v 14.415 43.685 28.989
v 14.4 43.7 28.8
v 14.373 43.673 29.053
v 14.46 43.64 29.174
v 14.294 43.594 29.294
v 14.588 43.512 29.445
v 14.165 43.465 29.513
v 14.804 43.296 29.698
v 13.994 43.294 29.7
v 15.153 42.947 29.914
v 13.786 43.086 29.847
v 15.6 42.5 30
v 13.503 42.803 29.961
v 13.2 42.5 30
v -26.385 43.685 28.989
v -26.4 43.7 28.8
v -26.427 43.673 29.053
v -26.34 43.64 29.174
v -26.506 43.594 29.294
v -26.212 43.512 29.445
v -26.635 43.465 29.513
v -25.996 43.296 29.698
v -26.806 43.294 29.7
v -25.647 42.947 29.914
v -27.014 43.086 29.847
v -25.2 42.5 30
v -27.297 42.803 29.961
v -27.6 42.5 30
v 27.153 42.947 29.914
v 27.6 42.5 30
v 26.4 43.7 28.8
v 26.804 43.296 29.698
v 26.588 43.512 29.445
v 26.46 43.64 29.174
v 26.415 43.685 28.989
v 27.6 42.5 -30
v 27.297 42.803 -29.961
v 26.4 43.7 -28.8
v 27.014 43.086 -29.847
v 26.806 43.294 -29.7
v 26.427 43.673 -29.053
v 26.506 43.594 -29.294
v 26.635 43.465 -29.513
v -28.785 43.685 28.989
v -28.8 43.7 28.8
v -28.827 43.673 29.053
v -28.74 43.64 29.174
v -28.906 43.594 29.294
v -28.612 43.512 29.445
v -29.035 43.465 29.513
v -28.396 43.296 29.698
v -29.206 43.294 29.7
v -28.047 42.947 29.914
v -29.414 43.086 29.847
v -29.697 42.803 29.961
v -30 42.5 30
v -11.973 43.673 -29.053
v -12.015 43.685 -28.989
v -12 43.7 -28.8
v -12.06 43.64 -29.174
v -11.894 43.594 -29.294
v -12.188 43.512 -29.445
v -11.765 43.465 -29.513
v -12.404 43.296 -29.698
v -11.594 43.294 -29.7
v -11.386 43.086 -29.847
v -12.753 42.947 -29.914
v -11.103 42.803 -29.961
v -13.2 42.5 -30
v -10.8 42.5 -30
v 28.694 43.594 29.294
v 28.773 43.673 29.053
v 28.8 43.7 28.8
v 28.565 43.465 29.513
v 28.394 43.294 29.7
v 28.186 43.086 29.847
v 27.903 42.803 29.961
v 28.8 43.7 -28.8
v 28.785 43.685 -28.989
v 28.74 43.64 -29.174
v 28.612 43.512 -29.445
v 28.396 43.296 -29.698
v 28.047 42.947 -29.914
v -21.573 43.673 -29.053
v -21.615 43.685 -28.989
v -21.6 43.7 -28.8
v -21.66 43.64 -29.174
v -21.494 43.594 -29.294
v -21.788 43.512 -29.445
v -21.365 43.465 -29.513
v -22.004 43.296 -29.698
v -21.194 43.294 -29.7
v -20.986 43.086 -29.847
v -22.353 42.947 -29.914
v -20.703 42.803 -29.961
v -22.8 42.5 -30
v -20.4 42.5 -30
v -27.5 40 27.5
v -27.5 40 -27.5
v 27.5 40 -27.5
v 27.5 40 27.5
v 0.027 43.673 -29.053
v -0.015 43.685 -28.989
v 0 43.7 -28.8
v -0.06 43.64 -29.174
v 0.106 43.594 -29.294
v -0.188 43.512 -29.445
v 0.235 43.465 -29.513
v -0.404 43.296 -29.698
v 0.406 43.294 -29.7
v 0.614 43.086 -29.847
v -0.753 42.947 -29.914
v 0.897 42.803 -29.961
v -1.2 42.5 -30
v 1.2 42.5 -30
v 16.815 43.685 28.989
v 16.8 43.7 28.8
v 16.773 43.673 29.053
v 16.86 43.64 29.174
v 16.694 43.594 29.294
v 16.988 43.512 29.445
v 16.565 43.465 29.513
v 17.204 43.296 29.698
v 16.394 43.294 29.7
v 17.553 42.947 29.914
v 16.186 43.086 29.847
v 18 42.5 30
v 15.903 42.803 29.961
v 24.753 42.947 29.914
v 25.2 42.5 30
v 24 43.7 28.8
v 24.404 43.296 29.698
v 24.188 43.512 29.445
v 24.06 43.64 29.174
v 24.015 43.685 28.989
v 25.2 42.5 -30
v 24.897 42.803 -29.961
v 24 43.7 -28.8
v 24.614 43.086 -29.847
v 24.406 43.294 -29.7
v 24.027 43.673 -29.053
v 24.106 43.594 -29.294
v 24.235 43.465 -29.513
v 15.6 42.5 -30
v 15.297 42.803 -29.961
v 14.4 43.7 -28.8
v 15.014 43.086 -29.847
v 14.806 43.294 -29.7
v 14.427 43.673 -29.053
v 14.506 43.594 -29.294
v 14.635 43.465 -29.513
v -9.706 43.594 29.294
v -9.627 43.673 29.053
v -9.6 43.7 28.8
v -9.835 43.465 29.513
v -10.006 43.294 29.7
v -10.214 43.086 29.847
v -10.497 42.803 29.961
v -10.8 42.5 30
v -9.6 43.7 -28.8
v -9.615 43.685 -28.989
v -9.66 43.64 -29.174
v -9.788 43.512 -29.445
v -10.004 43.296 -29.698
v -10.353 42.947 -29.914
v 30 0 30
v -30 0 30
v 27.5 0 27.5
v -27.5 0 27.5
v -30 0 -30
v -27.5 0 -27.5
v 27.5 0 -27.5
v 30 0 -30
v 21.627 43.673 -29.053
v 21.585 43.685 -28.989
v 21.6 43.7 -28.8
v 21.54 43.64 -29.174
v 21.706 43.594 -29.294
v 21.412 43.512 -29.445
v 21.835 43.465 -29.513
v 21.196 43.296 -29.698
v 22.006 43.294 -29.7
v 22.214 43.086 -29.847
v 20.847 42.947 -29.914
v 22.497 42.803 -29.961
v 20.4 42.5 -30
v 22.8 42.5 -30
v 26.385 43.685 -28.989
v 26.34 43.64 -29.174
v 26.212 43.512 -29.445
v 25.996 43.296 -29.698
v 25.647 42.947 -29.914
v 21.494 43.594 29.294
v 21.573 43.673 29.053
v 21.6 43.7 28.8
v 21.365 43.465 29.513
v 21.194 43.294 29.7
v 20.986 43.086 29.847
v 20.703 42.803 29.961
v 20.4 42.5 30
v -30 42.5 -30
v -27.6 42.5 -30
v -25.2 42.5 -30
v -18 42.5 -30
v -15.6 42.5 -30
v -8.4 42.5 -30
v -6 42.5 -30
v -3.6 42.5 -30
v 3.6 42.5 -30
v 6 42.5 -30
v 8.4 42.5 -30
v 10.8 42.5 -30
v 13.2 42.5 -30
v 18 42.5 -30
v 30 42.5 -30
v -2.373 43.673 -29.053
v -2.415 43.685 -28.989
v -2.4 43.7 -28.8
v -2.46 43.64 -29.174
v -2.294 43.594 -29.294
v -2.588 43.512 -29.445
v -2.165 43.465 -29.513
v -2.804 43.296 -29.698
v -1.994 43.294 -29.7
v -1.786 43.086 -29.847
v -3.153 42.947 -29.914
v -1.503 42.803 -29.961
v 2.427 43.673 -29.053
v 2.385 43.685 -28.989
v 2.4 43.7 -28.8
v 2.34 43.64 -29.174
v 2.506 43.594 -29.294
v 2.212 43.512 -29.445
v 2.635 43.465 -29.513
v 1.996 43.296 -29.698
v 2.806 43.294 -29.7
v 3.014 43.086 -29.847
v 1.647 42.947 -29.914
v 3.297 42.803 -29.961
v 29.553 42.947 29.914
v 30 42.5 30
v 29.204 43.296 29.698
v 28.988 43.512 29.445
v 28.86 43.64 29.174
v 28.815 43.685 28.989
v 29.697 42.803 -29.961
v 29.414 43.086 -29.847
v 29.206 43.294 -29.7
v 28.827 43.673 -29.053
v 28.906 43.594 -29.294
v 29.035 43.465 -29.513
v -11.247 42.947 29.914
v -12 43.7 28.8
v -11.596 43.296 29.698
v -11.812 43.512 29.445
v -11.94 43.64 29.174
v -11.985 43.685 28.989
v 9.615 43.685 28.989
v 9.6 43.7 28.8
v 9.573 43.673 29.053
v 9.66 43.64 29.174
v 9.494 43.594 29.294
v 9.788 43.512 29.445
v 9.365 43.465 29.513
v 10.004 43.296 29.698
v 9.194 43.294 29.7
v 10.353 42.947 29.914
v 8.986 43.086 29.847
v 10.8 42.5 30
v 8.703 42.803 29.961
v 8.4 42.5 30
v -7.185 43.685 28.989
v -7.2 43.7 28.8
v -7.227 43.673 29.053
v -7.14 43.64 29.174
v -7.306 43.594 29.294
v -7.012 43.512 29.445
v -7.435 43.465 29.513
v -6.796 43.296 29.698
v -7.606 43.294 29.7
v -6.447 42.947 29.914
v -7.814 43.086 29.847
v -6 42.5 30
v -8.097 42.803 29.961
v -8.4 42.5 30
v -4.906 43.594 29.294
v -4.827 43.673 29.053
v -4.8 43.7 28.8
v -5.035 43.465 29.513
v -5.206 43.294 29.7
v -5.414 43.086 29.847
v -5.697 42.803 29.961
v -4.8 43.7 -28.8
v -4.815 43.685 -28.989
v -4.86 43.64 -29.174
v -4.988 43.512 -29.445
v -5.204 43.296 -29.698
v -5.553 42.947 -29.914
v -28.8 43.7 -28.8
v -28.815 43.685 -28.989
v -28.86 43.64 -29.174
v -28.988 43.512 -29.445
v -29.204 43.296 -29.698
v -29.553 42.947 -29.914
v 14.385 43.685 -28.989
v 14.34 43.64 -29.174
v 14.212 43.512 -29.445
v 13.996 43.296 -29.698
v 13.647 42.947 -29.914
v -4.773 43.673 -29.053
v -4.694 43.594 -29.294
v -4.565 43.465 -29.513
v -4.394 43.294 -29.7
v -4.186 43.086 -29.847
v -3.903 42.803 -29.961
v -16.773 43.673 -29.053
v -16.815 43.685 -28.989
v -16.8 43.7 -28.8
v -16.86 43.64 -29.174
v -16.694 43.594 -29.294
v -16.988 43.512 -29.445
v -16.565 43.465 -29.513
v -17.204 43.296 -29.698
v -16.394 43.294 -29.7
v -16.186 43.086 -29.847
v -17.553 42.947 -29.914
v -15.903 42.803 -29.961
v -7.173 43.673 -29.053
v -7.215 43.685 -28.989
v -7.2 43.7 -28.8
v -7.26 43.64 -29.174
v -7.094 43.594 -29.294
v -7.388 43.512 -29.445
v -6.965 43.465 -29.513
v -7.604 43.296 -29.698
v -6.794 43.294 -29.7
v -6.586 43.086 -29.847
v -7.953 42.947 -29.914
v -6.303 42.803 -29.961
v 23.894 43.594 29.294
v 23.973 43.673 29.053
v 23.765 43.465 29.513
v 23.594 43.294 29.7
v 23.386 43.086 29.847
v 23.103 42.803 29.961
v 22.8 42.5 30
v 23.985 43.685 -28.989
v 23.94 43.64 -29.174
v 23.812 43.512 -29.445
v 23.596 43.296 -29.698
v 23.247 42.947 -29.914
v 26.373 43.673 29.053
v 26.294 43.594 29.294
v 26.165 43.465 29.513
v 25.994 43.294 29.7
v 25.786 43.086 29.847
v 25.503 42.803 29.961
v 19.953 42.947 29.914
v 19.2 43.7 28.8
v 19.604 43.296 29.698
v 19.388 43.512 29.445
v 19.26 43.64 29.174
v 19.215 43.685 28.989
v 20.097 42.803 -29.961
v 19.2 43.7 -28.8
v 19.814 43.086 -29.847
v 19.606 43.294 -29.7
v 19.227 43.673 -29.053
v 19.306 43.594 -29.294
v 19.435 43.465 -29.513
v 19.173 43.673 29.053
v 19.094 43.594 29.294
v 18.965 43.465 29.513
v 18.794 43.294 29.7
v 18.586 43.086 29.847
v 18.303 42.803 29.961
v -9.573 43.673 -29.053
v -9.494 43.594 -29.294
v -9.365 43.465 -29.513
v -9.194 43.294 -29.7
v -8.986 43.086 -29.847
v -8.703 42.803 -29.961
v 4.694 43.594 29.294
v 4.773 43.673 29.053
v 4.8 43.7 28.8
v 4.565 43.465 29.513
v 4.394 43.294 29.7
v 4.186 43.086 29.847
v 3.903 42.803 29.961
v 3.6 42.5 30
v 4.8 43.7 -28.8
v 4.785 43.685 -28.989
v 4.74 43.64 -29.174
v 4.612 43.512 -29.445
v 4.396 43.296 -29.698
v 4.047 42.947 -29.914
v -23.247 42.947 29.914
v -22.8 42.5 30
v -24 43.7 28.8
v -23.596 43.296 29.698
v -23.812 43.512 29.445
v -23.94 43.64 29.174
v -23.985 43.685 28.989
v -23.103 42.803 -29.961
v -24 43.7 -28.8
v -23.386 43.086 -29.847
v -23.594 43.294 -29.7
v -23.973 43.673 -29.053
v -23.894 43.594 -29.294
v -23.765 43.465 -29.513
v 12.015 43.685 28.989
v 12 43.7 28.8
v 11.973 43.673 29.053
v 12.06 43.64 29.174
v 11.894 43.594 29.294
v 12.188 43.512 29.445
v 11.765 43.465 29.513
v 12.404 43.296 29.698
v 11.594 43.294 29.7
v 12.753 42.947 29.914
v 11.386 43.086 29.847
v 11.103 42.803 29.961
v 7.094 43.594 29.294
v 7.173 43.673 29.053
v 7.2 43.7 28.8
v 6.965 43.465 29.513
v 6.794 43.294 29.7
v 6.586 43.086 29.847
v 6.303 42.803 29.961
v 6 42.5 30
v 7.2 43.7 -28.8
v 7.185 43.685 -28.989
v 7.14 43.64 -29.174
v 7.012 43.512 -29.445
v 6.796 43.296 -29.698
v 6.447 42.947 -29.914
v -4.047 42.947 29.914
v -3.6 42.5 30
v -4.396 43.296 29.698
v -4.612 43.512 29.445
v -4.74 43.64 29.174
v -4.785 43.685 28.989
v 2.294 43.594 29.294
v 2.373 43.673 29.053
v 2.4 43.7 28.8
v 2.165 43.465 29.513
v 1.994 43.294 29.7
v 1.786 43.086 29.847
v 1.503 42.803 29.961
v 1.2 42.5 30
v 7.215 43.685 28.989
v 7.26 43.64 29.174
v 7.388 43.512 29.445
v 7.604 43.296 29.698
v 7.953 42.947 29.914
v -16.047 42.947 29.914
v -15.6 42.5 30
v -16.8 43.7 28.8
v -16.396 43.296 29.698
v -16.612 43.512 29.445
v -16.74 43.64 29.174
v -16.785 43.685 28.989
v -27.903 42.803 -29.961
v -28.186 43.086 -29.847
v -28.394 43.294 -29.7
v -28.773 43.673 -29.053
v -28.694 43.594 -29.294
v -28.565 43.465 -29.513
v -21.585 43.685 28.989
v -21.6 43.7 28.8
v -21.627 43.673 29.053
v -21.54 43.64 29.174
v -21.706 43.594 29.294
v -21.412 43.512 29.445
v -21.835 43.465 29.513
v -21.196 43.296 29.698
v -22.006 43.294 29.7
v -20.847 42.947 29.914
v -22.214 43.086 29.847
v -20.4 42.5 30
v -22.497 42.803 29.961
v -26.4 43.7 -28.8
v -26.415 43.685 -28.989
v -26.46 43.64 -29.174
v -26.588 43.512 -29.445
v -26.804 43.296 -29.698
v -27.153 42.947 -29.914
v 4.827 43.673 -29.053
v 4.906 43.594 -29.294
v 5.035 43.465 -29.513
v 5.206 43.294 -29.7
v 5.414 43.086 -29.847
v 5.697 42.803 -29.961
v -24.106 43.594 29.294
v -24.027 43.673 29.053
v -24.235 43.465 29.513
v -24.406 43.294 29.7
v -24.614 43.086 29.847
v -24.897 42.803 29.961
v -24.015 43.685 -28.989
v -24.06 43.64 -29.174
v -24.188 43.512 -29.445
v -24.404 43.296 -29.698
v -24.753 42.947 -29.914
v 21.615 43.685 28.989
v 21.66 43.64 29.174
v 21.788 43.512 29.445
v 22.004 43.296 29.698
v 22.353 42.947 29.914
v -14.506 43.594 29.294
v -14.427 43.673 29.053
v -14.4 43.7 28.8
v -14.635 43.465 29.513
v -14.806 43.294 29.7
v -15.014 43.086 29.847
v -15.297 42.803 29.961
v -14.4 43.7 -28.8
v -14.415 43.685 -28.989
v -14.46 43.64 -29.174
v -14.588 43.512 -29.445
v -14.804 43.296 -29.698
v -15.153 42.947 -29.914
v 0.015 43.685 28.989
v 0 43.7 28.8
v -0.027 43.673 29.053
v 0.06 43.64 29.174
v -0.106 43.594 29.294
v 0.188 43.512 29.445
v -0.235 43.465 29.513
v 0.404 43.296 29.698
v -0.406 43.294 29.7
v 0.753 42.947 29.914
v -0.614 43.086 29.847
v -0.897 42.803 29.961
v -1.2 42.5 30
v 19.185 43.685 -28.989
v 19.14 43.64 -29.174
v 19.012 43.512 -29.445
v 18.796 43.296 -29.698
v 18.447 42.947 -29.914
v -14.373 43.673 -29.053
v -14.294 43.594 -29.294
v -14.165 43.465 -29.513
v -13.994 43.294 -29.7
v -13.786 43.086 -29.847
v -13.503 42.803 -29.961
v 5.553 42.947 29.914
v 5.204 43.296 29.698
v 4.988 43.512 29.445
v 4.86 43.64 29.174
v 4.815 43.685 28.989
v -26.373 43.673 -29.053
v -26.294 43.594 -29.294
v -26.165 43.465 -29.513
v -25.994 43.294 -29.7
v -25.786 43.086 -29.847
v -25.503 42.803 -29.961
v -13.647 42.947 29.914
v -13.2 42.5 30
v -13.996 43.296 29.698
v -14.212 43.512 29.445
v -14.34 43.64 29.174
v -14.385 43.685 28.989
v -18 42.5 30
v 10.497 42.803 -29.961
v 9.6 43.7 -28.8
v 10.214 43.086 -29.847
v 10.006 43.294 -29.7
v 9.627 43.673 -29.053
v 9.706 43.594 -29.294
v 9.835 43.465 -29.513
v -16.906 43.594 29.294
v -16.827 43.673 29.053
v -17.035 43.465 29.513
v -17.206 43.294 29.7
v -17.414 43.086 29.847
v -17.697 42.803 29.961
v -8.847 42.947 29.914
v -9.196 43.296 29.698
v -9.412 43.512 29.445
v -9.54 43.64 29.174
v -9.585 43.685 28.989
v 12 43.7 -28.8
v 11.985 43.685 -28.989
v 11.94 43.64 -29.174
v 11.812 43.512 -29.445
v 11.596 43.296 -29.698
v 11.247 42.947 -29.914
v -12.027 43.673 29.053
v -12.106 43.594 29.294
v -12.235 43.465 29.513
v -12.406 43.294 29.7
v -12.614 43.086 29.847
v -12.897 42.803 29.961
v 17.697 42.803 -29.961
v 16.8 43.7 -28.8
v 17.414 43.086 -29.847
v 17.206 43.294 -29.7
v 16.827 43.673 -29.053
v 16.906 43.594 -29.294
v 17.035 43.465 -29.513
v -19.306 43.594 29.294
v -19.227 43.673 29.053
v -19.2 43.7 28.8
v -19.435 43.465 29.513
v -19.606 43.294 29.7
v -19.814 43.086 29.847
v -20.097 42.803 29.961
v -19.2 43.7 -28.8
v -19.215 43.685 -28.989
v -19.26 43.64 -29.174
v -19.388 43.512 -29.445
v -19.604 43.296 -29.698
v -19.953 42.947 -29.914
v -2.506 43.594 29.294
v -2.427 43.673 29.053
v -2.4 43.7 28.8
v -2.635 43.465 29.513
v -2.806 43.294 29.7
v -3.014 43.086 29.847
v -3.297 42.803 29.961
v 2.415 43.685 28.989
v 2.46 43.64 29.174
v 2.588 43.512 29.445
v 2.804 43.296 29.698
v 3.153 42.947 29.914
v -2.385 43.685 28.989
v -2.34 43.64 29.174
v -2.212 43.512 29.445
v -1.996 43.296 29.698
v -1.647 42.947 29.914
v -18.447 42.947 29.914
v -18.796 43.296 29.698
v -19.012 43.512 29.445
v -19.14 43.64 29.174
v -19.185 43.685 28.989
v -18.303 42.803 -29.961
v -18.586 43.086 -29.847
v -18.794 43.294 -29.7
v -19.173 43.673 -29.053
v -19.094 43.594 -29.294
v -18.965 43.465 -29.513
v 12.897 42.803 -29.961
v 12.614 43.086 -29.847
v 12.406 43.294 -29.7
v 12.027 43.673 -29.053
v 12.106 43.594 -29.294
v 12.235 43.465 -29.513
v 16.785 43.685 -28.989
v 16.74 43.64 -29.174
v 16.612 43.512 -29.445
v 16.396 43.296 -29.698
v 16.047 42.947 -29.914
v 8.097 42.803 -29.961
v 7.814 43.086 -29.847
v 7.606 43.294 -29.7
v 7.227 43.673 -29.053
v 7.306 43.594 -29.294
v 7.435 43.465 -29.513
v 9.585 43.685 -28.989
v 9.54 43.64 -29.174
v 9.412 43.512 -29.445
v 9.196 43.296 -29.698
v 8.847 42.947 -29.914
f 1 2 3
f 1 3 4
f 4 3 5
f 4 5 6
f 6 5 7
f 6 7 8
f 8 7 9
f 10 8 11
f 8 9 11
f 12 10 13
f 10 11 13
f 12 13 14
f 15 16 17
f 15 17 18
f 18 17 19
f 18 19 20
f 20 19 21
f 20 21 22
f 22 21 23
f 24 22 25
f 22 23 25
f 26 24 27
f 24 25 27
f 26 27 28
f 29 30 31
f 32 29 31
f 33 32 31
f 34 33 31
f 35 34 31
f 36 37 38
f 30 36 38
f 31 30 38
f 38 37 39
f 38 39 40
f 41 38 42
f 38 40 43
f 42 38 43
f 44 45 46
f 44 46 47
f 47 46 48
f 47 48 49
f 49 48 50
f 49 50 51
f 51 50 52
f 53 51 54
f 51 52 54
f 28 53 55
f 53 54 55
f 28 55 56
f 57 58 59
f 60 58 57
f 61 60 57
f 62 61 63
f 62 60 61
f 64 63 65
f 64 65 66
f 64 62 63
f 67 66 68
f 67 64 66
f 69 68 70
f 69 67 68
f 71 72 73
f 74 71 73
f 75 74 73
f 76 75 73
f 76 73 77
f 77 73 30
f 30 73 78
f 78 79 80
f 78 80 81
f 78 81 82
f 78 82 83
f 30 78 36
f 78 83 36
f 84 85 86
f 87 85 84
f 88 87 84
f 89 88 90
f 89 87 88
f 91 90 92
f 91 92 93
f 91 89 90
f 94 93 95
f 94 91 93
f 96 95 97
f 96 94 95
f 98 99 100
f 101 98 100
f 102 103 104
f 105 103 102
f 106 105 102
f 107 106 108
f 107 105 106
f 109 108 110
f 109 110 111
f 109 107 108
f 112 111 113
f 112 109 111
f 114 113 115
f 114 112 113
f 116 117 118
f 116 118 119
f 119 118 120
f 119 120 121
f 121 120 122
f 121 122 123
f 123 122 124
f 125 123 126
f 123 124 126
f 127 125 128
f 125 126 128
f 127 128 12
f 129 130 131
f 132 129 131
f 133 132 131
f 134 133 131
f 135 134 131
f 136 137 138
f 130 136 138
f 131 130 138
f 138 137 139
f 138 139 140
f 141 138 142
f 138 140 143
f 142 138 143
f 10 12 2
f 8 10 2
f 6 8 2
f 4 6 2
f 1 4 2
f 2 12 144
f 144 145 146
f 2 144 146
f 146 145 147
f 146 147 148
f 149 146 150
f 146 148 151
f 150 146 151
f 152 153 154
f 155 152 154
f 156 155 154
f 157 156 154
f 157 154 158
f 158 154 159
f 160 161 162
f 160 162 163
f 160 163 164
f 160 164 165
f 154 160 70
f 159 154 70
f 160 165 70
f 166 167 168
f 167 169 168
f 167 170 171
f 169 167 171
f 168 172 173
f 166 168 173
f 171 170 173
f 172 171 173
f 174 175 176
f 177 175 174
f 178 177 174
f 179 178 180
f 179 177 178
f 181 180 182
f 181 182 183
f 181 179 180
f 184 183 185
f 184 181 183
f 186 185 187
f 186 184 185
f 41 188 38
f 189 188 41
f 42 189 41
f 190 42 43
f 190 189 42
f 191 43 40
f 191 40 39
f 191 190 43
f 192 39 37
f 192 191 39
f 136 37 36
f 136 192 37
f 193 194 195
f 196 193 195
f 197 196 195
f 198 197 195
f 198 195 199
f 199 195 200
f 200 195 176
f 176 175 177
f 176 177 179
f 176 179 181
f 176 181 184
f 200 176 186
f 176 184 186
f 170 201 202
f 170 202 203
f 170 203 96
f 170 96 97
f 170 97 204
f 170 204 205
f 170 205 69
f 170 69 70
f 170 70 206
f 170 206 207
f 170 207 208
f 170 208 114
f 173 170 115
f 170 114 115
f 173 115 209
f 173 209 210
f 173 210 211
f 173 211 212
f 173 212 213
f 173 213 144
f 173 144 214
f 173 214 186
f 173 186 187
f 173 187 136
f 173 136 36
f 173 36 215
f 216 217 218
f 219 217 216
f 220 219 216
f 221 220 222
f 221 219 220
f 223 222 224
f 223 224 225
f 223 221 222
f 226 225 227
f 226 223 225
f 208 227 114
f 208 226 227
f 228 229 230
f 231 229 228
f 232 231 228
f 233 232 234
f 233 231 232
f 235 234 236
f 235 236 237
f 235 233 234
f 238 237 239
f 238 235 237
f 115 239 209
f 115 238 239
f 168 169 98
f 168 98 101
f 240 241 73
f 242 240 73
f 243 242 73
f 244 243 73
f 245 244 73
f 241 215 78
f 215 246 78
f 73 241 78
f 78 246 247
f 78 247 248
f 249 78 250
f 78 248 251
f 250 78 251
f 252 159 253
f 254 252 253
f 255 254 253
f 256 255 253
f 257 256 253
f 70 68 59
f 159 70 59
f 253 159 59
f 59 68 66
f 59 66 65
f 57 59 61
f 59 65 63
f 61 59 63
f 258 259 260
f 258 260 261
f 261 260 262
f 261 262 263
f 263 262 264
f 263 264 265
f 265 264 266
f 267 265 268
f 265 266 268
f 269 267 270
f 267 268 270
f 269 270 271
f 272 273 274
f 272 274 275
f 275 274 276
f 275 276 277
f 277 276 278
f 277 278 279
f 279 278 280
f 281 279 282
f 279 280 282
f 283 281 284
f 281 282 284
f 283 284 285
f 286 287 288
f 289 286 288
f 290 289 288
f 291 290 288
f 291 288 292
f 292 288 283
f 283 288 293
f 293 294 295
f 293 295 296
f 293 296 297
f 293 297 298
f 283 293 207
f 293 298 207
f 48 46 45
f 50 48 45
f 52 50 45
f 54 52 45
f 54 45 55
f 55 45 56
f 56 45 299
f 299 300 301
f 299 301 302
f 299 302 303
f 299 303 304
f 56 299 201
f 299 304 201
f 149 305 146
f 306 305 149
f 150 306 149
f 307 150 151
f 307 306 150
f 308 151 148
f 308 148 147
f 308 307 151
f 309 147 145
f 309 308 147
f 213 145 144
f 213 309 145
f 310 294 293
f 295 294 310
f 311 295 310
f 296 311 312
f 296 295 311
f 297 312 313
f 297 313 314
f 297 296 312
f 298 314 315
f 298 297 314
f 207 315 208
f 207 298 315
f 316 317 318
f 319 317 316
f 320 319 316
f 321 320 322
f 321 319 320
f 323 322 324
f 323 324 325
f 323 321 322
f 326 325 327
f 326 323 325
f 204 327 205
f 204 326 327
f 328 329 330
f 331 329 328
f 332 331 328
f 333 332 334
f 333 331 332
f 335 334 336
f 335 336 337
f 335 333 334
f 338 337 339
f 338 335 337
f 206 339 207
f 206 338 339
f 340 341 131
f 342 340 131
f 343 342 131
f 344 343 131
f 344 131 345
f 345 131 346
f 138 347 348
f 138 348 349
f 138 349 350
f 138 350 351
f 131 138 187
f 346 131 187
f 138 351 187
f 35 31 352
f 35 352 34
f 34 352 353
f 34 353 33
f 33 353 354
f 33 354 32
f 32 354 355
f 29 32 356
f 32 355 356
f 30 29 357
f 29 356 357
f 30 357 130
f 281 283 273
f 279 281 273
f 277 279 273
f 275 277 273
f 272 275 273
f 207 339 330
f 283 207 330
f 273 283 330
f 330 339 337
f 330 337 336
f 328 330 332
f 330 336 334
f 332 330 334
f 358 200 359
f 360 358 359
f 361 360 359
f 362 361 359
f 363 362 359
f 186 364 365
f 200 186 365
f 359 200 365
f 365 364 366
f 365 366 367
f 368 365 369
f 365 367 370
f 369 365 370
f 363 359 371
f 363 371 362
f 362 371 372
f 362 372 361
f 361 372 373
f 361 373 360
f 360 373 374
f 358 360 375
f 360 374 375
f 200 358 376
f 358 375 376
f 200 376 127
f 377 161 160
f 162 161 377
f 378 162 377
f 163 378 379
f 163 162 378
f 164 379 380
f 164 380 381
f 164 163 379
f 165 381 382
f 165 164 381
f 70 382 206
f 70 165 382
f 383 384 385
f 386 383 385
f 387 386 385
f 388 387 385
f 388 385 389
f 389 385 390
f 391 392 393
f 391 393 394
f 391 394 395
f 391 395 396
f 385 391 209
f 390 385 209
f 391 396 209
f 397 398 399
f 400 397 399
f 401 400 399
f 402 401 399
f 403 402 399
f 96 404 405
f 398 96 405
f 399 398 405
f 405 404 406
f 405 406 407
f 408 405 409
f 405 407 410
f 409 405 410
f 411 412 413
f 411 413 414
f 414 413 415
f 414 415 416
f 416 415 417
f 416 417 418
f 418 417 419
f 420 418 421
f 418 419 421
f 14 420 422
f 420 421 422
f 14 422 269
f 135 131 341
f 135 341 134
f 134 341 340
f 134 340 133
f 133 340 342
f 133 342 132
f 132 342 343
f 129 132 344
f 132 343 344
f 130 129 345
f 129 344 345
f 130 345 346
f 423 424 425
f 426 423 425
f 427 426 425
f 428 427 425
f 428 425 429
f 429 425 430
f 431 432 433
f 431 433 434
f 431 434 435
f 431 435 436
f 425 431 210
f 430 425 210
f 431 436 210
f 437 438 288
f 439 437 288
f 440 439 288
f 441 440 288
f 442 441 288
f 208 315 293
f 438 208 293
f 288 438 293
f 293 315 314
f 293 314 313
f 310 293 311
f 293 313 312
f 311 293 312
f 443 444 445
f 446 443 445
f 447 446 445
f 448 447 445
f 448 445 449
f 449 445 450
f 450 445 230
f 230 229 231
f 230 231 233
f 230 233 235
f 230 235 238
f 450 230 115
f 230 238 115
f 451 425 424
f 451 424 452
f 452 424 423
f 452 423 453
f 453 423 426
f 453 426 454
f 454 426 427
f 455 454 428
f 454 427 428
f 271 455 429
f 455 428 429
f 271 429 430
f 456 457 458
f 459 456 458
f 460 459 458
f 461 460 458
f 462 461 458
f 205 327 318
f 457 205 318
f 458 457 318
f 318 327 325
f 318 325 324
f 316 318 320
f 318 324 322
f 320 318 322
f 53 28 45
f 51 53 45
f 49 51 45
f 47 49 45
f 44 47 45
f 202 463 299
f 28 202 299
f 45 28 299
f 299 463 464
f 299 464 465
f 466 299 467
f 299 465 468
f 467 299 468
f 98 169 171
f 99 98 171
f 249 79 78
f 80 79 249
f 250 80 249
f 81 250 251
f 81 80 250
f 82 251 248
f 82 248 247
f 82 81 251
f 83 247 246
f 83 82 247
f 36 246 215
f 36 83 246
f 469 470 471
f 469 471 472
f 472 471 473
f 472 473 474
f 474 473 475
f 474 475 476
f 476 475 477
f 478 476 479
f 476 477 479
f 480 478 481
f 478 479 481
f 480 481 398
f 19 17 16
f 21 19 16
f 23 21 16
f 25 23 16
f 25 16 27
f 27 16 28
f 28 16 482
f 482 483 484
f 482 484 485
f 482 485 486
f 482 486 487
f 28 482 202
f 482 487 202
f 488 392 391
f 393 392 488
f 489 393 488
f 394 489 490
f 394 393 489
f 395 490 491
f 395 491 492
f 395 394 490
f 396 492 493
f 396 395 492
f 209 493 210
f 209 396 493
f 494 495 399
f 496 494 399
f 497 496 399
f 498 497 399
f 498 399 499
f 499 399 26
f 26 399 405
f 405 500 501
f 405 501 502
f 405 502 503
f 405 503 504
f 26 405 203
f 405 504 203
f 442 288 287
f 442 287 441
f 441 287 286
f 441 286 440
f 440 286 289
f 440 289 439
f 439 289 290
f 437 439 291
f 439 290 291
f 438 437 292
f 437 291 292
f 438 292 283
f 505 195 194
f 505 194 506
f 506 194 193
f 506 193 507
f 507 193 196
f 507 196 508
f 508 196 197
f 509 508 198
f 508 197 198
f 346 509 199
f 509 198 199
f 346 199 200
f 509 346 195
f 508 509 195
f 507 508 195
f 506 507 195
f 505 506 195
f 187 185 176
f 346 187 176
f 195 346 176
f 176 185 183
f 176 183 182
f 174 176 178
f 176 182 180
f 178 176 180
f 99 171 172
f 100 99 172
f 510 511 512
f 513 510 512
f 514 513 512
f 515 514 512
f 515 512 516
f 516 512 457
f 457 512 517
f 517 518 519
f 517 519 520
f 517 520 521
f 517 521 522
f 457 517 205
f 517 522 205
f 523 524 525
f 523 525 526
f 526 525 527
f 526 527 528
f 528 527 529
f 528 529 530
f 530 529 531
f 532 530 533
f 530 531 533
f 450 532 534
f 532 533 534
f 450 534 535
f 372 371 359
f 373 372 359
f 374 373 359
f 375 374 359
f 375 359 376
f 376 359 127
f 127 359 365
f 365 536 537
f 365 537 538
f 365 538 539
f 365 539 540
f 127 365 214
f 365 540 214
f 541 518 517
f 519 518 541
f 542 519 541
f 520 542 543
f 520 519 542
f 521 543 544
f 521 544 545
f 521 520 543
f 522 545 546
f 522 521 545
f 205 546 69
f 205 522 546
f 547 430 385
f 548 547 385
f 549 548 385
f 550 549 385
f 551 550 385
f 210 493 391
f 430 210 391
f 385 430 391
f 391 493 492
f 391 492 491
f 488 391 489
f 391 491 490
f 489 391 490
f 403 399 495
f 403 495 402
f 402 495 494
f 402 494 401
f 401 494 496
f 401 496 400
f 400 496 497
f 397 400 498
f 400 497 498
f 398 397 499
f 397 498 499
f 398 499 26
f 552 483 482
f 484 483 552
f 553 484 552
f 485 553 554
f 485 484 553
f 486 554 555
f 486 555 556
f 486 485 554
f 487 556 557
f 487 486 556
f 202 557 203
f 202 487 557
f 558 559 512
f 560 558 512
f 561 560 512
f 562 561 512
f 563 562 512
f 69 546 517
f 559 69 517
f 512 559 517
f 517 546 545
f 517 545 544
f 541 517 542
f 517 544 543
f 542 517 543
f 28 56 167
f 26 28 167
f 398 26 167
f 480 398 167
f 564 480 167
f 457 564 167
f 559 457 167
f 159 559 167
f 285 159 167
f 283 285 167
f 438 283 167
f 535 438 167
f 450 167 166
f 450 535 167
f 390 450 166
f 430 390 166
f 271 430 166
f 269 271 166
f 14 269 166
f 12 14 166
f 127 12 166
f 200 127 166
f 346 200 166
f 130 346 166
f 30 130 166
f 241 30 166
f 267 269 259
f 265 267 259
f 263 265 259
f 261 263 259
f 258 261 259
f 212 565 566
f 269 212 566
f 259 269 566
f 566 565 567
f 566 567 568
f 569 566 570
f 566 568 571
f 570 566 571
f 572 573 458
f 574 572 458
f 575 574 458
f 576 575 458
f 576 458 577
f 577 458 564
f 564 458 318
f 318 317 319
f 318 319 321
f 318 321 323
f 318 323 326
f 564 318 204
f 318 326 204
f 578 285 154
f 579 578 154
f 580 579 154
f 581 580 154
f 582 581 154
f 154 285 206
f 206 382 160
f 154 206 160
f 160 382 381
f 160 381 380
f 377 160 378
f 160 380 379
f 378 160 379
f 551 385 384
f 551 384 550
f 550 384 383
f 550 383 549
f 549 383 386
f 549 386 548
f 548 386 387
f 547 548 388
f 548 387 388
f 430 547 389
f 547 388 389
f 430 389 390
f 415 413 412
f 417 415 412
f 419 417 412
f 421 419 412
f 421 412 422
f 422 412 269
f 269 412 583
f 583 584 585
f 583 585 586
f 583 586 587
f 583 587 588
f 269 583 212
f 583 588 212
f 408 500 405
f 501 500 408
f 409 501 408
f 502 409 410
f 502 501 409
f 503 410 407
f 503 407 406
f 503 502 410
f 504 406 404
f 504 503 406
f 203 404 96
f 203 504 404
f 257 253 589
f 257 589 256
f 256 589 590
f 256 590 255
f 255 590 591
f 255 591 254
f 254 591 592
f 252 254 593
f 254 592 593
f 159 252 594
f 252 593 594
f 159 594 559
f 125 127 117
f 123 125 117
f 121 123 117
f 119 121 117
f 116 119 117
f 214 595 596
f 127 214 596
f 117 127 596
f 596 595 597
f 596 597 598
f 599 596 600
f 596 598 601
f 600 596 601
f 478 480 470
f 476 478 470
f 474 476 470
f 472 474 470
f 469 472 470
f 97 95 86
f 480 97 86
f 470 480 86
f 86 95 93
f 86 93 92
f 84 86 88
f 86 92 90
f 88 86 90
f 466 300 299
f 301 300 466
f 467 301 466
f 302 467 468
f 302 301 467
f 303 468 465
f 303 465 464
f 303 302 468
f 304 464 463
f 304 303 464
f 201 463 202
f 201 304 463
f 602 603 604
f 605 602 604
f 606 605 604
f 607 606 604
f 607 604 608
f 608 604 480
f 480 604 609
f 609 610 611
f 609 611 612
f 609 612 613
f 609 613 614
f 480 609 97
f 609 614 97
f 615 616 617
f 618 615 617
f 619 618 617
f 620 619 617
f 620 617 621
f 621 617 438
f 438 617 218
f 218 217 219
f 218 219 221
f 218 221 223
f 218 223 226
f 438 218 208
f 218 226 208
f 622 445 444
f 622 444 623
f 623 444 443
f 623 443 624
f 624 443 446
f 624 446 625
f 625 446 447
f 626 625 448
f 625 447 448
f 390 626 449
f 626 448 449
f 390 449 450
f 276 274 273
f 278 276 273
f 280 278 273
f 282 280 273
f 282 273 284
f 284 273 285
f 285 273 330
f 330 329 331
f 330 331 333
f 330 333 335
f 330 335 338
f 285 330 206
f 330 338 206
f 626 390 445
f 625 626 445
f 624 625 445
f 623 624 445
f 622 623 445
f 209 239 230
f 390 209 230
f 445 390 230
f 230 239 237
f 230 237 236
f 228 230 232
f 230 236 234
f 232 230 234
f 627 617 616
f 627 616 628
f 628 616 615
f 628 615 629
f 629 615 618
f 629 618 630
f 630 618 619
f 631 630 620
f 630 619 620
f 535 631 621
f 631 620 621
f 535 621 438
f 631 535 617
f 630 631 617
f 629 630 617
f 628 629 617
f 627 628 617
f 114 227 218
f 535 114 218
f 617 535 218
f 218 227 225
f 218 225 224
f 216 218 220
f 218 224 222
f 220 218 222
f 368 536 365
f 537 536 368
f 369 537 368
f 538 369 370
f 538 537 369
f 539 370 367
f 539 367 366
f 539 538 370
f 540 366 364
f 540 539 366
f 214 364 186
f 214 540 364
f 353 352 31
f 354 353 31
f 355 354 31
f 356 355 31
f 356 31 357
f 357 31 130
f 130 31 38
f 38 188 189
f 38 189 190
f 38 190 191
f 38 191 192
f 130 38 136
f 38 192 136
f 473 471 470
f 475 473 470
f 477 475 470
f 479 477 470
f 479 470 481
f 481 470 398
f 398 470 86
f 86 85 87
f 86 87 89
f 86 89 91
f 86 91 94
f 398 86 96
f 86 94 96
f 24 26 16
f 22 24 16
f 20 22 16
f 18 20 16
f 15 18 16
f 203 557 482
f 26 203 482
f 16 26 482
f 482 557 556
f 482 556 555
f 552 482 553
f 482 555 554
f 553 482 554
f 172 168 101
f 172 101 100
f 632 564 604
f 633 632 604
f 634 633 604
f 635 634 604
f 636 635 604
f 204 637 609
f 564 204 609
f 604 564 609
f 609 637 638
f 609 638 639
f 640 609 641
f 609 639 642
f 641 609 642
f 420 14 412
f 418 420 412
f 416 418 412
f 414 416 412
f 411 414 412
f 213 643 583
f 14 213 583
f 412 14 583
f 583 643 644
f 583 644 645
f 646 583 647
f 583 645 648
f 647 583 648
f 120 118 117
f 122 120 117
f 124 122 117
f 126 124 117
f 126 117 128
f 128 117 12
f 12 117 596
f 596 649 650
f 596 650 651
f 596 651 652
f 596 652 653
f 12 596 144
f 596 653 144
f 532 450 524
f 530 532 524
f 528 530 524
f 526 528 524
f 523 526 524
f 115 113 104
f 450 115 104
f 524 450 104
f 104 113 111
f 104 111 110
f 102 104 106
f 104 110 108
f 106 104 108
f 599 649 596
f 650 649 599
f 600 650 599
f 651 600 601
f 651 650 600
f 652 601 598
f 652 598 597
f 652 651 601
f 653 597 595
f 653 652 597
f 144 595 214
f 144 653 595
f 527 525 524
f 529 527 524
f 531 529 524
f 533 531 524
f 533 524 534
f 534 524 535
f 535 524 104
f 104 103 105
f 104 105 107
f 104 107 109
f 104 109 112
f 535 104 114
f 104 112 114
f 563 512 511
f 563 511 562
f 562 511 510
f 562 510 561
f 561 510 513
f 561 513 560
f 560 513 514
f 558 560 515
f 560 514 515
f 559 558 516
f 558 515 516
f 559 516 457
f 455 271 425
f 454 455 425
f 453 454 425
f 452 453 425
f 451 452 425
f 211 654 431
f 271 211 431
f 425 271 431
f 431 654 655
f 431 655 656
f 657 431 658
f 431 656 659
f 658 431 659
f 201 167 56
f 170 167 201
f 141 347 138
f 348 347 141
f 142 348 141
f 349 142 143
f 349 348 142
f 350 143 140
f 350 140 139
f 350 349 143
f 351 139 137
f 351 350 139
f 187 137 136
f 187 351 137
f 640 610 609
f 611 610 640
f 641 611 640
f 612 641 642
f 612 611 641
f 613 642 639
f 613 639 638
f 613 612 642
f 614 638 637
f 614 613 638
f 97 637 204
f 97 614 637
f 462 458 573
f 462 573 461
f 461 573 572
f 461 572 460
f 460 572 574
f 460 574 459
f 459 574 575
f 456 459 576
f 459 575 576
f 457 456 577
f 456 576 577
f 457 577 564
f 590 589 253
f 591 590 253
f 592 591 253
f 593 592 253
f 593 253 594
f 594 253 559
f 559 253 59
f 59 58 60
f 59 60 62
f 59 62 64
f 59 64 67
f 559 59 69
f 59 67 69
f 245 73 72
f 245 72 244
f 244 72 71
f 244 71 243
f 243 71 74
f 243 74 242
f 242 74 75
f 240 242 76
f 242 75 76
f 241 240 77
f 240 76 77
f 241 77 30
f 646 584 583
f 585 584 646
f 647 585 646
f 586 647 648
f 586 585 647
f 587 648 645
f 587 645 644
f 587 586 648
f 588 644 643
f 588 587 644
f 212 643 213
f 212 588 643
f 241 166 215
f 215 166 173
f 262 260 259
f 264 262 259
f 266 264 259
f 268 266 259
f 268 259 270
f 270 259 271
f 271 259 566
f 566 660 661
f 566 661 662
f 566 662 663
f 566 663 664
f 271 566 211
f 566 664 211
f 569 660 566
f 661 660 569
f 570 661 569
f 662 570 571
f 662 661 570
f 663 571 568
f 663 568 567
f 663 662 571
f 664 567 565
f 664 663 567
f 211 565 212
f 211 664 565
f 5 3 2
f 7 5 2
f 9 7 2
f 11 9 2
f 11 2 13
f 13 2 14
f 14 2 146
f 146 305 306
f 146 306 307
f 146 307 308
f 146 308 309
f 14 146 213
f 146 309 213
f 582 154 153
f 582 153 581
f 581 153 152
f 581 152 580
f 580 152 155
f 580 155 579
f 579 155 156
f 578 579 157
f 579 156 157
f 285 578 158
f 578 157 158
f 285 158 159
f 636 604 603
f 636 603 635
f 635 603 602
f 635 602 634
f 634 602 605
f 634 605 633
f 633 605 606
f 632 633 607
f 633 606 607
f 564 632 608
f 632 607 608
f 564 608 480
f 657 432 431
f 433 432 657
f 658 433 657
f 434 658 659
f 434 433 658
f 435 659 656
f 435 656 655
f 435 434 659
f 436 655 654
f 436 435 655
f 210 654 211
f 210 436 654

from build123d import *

# Parameters (mm, degrees)
SKETCH1_W           = 60
SKETCH1_H           = 60
SKETCH1_W_2         = 55
SKETCH1_H_2         = 55
BOSS_EXTRUDE1_DEPTH = 40
SKETCH2_W           = 60
SKETCH2_H           = 60
BOSS_EXTRUDE2_DEPTH = 2.5
BOSS_EXTRUDE3_DEPTH = 60
CUT_EXTRUDE1_REACH  = 82.061


with BuildPart() as part:
    # Sketch1 → Boss-Extrude1 (new body)
    with BuildSketch(Plane(origin=(0, 0, 0), x_dir=(1, 0, 0), z_dir=(0, 1, 0))):
        Rectangle(SKETCH1_W, SKETCH1_H)
        Rectangle(SKETCH1_W_2, SKETCH1_H_2, mode=Mode.SUBTRACT)
    extrude(amount=BOSS_EXTRUDE1_DEPTH)

    # Sketch2 → Boss-Extrude2 (add)
    with BuildSketch(Plane(origin=(0, 40, 0), x_dir=(1, 0, 0), z_dir=(0, 1, 0))):
        Rectangle(SKETCH2_W, SKETCH2_H)
    extrude(amount=BOSS_EXTRUDE2_DEPTH)

    # Sketch3 → Boss-Extrude3 (add)
    with BuildSketch(Plane(origin=(0, 0, -30), x_dir=(-1, 0, 0), z_dir=(0, 0, -1))):
        Polygon((-30, 42.5), (-28.8, 43.7), (-27.6, 42.5), (-26.4, 43.7), (-25.2, 42.5), (-24, 43.7), (-22.8, 42.5), (-21.6, 43.7), (-20.4, 42.5), (-19.2, 43.7), (-18, 42.5), (-16.8, 43.7), (-15.6, 42.5), (-14.4, 43.7), (-13.2, 42.5), (-12, 43.7), (-10.8, 42.5), (-9.6, 43.7), (-8.4, 42.5), (-7.2, 43.7), (-6, 42.5), (-4.8, 43.7), (-3.6, 42.5), (-2.4, 43.7), (-1.2, 42.5), (0, 43.7), (1.2, 42.5), (2.4, 43.7), (3.6, 42.5), (4.8, 43.7), (6, 42.5), (7.2, 43.7), (8.4, 42.5), (9.6, 43.7), (10.8, 42.5), (12, 43.7), (13.2, 42.5), (14.4, 43.7), (15.6, 42.5), (16.8, 43.7), (18, 42.5), (19.2, 43.7), (20.4, 42.5), (21.6, 43.7), (22.8, 42.5), (24, 43.7), (25.2, 42.5), (26.4, 43.7), (27.6, 42.5), (28.8, 43.7), (30, 42.5), (30, 42.170064374), (-30, 42.170064374), align=None)
    extrude(amount=-BOSS_EXTRUDE3_DEPTH)

    # Cut-Extrude1: up to this face of the body (flat: up to its plane)
    cut_extrude1_end = Plane(part.part.faces().sort_by_distance((30, 21.25, 0))[0])
    # Sketch4 → Cut-Extrude1 (cut, up to the picked face)
    with BuildSketch(Plane.ZY.offset(30), mode=Mode.PRIVATE) as cut_extrude1_sk1:
        with BuildLine():
            Line((-30, 42.5), (-30, 43.7))
            Line((-30, 43.7), (-28.8, 43.7))
            ThreePointArc((-28.8, 43.7), (-29.648528137, 43.348528137), (-30, 42.5))
        make_face()
    cut_extrude1_tool1 = split(extrude(cut_extrude1_sk1.sketch, amount=-CUT_EXTRUDE1_REACH, mode=Mode.PRIVATE), bisect_by=cut_extrude1_end, keep=Keep.BOTH, mode=Mode.PRIVATE)
    cut_extrude1 = cut_extrude1_tool1.solids().sort_by(Axis((-30, 43.431958, -29.731958), (1, 0, 0)))[0]
    add(cut_extrude1, mode=Mode.SUBTRACT)

    # Mirror1: Cut-Extrude1 across plane
    add(cut_extrude1.mirror(Plane.XY), mode=Mode.SUBTRACT)


solid = part.part
